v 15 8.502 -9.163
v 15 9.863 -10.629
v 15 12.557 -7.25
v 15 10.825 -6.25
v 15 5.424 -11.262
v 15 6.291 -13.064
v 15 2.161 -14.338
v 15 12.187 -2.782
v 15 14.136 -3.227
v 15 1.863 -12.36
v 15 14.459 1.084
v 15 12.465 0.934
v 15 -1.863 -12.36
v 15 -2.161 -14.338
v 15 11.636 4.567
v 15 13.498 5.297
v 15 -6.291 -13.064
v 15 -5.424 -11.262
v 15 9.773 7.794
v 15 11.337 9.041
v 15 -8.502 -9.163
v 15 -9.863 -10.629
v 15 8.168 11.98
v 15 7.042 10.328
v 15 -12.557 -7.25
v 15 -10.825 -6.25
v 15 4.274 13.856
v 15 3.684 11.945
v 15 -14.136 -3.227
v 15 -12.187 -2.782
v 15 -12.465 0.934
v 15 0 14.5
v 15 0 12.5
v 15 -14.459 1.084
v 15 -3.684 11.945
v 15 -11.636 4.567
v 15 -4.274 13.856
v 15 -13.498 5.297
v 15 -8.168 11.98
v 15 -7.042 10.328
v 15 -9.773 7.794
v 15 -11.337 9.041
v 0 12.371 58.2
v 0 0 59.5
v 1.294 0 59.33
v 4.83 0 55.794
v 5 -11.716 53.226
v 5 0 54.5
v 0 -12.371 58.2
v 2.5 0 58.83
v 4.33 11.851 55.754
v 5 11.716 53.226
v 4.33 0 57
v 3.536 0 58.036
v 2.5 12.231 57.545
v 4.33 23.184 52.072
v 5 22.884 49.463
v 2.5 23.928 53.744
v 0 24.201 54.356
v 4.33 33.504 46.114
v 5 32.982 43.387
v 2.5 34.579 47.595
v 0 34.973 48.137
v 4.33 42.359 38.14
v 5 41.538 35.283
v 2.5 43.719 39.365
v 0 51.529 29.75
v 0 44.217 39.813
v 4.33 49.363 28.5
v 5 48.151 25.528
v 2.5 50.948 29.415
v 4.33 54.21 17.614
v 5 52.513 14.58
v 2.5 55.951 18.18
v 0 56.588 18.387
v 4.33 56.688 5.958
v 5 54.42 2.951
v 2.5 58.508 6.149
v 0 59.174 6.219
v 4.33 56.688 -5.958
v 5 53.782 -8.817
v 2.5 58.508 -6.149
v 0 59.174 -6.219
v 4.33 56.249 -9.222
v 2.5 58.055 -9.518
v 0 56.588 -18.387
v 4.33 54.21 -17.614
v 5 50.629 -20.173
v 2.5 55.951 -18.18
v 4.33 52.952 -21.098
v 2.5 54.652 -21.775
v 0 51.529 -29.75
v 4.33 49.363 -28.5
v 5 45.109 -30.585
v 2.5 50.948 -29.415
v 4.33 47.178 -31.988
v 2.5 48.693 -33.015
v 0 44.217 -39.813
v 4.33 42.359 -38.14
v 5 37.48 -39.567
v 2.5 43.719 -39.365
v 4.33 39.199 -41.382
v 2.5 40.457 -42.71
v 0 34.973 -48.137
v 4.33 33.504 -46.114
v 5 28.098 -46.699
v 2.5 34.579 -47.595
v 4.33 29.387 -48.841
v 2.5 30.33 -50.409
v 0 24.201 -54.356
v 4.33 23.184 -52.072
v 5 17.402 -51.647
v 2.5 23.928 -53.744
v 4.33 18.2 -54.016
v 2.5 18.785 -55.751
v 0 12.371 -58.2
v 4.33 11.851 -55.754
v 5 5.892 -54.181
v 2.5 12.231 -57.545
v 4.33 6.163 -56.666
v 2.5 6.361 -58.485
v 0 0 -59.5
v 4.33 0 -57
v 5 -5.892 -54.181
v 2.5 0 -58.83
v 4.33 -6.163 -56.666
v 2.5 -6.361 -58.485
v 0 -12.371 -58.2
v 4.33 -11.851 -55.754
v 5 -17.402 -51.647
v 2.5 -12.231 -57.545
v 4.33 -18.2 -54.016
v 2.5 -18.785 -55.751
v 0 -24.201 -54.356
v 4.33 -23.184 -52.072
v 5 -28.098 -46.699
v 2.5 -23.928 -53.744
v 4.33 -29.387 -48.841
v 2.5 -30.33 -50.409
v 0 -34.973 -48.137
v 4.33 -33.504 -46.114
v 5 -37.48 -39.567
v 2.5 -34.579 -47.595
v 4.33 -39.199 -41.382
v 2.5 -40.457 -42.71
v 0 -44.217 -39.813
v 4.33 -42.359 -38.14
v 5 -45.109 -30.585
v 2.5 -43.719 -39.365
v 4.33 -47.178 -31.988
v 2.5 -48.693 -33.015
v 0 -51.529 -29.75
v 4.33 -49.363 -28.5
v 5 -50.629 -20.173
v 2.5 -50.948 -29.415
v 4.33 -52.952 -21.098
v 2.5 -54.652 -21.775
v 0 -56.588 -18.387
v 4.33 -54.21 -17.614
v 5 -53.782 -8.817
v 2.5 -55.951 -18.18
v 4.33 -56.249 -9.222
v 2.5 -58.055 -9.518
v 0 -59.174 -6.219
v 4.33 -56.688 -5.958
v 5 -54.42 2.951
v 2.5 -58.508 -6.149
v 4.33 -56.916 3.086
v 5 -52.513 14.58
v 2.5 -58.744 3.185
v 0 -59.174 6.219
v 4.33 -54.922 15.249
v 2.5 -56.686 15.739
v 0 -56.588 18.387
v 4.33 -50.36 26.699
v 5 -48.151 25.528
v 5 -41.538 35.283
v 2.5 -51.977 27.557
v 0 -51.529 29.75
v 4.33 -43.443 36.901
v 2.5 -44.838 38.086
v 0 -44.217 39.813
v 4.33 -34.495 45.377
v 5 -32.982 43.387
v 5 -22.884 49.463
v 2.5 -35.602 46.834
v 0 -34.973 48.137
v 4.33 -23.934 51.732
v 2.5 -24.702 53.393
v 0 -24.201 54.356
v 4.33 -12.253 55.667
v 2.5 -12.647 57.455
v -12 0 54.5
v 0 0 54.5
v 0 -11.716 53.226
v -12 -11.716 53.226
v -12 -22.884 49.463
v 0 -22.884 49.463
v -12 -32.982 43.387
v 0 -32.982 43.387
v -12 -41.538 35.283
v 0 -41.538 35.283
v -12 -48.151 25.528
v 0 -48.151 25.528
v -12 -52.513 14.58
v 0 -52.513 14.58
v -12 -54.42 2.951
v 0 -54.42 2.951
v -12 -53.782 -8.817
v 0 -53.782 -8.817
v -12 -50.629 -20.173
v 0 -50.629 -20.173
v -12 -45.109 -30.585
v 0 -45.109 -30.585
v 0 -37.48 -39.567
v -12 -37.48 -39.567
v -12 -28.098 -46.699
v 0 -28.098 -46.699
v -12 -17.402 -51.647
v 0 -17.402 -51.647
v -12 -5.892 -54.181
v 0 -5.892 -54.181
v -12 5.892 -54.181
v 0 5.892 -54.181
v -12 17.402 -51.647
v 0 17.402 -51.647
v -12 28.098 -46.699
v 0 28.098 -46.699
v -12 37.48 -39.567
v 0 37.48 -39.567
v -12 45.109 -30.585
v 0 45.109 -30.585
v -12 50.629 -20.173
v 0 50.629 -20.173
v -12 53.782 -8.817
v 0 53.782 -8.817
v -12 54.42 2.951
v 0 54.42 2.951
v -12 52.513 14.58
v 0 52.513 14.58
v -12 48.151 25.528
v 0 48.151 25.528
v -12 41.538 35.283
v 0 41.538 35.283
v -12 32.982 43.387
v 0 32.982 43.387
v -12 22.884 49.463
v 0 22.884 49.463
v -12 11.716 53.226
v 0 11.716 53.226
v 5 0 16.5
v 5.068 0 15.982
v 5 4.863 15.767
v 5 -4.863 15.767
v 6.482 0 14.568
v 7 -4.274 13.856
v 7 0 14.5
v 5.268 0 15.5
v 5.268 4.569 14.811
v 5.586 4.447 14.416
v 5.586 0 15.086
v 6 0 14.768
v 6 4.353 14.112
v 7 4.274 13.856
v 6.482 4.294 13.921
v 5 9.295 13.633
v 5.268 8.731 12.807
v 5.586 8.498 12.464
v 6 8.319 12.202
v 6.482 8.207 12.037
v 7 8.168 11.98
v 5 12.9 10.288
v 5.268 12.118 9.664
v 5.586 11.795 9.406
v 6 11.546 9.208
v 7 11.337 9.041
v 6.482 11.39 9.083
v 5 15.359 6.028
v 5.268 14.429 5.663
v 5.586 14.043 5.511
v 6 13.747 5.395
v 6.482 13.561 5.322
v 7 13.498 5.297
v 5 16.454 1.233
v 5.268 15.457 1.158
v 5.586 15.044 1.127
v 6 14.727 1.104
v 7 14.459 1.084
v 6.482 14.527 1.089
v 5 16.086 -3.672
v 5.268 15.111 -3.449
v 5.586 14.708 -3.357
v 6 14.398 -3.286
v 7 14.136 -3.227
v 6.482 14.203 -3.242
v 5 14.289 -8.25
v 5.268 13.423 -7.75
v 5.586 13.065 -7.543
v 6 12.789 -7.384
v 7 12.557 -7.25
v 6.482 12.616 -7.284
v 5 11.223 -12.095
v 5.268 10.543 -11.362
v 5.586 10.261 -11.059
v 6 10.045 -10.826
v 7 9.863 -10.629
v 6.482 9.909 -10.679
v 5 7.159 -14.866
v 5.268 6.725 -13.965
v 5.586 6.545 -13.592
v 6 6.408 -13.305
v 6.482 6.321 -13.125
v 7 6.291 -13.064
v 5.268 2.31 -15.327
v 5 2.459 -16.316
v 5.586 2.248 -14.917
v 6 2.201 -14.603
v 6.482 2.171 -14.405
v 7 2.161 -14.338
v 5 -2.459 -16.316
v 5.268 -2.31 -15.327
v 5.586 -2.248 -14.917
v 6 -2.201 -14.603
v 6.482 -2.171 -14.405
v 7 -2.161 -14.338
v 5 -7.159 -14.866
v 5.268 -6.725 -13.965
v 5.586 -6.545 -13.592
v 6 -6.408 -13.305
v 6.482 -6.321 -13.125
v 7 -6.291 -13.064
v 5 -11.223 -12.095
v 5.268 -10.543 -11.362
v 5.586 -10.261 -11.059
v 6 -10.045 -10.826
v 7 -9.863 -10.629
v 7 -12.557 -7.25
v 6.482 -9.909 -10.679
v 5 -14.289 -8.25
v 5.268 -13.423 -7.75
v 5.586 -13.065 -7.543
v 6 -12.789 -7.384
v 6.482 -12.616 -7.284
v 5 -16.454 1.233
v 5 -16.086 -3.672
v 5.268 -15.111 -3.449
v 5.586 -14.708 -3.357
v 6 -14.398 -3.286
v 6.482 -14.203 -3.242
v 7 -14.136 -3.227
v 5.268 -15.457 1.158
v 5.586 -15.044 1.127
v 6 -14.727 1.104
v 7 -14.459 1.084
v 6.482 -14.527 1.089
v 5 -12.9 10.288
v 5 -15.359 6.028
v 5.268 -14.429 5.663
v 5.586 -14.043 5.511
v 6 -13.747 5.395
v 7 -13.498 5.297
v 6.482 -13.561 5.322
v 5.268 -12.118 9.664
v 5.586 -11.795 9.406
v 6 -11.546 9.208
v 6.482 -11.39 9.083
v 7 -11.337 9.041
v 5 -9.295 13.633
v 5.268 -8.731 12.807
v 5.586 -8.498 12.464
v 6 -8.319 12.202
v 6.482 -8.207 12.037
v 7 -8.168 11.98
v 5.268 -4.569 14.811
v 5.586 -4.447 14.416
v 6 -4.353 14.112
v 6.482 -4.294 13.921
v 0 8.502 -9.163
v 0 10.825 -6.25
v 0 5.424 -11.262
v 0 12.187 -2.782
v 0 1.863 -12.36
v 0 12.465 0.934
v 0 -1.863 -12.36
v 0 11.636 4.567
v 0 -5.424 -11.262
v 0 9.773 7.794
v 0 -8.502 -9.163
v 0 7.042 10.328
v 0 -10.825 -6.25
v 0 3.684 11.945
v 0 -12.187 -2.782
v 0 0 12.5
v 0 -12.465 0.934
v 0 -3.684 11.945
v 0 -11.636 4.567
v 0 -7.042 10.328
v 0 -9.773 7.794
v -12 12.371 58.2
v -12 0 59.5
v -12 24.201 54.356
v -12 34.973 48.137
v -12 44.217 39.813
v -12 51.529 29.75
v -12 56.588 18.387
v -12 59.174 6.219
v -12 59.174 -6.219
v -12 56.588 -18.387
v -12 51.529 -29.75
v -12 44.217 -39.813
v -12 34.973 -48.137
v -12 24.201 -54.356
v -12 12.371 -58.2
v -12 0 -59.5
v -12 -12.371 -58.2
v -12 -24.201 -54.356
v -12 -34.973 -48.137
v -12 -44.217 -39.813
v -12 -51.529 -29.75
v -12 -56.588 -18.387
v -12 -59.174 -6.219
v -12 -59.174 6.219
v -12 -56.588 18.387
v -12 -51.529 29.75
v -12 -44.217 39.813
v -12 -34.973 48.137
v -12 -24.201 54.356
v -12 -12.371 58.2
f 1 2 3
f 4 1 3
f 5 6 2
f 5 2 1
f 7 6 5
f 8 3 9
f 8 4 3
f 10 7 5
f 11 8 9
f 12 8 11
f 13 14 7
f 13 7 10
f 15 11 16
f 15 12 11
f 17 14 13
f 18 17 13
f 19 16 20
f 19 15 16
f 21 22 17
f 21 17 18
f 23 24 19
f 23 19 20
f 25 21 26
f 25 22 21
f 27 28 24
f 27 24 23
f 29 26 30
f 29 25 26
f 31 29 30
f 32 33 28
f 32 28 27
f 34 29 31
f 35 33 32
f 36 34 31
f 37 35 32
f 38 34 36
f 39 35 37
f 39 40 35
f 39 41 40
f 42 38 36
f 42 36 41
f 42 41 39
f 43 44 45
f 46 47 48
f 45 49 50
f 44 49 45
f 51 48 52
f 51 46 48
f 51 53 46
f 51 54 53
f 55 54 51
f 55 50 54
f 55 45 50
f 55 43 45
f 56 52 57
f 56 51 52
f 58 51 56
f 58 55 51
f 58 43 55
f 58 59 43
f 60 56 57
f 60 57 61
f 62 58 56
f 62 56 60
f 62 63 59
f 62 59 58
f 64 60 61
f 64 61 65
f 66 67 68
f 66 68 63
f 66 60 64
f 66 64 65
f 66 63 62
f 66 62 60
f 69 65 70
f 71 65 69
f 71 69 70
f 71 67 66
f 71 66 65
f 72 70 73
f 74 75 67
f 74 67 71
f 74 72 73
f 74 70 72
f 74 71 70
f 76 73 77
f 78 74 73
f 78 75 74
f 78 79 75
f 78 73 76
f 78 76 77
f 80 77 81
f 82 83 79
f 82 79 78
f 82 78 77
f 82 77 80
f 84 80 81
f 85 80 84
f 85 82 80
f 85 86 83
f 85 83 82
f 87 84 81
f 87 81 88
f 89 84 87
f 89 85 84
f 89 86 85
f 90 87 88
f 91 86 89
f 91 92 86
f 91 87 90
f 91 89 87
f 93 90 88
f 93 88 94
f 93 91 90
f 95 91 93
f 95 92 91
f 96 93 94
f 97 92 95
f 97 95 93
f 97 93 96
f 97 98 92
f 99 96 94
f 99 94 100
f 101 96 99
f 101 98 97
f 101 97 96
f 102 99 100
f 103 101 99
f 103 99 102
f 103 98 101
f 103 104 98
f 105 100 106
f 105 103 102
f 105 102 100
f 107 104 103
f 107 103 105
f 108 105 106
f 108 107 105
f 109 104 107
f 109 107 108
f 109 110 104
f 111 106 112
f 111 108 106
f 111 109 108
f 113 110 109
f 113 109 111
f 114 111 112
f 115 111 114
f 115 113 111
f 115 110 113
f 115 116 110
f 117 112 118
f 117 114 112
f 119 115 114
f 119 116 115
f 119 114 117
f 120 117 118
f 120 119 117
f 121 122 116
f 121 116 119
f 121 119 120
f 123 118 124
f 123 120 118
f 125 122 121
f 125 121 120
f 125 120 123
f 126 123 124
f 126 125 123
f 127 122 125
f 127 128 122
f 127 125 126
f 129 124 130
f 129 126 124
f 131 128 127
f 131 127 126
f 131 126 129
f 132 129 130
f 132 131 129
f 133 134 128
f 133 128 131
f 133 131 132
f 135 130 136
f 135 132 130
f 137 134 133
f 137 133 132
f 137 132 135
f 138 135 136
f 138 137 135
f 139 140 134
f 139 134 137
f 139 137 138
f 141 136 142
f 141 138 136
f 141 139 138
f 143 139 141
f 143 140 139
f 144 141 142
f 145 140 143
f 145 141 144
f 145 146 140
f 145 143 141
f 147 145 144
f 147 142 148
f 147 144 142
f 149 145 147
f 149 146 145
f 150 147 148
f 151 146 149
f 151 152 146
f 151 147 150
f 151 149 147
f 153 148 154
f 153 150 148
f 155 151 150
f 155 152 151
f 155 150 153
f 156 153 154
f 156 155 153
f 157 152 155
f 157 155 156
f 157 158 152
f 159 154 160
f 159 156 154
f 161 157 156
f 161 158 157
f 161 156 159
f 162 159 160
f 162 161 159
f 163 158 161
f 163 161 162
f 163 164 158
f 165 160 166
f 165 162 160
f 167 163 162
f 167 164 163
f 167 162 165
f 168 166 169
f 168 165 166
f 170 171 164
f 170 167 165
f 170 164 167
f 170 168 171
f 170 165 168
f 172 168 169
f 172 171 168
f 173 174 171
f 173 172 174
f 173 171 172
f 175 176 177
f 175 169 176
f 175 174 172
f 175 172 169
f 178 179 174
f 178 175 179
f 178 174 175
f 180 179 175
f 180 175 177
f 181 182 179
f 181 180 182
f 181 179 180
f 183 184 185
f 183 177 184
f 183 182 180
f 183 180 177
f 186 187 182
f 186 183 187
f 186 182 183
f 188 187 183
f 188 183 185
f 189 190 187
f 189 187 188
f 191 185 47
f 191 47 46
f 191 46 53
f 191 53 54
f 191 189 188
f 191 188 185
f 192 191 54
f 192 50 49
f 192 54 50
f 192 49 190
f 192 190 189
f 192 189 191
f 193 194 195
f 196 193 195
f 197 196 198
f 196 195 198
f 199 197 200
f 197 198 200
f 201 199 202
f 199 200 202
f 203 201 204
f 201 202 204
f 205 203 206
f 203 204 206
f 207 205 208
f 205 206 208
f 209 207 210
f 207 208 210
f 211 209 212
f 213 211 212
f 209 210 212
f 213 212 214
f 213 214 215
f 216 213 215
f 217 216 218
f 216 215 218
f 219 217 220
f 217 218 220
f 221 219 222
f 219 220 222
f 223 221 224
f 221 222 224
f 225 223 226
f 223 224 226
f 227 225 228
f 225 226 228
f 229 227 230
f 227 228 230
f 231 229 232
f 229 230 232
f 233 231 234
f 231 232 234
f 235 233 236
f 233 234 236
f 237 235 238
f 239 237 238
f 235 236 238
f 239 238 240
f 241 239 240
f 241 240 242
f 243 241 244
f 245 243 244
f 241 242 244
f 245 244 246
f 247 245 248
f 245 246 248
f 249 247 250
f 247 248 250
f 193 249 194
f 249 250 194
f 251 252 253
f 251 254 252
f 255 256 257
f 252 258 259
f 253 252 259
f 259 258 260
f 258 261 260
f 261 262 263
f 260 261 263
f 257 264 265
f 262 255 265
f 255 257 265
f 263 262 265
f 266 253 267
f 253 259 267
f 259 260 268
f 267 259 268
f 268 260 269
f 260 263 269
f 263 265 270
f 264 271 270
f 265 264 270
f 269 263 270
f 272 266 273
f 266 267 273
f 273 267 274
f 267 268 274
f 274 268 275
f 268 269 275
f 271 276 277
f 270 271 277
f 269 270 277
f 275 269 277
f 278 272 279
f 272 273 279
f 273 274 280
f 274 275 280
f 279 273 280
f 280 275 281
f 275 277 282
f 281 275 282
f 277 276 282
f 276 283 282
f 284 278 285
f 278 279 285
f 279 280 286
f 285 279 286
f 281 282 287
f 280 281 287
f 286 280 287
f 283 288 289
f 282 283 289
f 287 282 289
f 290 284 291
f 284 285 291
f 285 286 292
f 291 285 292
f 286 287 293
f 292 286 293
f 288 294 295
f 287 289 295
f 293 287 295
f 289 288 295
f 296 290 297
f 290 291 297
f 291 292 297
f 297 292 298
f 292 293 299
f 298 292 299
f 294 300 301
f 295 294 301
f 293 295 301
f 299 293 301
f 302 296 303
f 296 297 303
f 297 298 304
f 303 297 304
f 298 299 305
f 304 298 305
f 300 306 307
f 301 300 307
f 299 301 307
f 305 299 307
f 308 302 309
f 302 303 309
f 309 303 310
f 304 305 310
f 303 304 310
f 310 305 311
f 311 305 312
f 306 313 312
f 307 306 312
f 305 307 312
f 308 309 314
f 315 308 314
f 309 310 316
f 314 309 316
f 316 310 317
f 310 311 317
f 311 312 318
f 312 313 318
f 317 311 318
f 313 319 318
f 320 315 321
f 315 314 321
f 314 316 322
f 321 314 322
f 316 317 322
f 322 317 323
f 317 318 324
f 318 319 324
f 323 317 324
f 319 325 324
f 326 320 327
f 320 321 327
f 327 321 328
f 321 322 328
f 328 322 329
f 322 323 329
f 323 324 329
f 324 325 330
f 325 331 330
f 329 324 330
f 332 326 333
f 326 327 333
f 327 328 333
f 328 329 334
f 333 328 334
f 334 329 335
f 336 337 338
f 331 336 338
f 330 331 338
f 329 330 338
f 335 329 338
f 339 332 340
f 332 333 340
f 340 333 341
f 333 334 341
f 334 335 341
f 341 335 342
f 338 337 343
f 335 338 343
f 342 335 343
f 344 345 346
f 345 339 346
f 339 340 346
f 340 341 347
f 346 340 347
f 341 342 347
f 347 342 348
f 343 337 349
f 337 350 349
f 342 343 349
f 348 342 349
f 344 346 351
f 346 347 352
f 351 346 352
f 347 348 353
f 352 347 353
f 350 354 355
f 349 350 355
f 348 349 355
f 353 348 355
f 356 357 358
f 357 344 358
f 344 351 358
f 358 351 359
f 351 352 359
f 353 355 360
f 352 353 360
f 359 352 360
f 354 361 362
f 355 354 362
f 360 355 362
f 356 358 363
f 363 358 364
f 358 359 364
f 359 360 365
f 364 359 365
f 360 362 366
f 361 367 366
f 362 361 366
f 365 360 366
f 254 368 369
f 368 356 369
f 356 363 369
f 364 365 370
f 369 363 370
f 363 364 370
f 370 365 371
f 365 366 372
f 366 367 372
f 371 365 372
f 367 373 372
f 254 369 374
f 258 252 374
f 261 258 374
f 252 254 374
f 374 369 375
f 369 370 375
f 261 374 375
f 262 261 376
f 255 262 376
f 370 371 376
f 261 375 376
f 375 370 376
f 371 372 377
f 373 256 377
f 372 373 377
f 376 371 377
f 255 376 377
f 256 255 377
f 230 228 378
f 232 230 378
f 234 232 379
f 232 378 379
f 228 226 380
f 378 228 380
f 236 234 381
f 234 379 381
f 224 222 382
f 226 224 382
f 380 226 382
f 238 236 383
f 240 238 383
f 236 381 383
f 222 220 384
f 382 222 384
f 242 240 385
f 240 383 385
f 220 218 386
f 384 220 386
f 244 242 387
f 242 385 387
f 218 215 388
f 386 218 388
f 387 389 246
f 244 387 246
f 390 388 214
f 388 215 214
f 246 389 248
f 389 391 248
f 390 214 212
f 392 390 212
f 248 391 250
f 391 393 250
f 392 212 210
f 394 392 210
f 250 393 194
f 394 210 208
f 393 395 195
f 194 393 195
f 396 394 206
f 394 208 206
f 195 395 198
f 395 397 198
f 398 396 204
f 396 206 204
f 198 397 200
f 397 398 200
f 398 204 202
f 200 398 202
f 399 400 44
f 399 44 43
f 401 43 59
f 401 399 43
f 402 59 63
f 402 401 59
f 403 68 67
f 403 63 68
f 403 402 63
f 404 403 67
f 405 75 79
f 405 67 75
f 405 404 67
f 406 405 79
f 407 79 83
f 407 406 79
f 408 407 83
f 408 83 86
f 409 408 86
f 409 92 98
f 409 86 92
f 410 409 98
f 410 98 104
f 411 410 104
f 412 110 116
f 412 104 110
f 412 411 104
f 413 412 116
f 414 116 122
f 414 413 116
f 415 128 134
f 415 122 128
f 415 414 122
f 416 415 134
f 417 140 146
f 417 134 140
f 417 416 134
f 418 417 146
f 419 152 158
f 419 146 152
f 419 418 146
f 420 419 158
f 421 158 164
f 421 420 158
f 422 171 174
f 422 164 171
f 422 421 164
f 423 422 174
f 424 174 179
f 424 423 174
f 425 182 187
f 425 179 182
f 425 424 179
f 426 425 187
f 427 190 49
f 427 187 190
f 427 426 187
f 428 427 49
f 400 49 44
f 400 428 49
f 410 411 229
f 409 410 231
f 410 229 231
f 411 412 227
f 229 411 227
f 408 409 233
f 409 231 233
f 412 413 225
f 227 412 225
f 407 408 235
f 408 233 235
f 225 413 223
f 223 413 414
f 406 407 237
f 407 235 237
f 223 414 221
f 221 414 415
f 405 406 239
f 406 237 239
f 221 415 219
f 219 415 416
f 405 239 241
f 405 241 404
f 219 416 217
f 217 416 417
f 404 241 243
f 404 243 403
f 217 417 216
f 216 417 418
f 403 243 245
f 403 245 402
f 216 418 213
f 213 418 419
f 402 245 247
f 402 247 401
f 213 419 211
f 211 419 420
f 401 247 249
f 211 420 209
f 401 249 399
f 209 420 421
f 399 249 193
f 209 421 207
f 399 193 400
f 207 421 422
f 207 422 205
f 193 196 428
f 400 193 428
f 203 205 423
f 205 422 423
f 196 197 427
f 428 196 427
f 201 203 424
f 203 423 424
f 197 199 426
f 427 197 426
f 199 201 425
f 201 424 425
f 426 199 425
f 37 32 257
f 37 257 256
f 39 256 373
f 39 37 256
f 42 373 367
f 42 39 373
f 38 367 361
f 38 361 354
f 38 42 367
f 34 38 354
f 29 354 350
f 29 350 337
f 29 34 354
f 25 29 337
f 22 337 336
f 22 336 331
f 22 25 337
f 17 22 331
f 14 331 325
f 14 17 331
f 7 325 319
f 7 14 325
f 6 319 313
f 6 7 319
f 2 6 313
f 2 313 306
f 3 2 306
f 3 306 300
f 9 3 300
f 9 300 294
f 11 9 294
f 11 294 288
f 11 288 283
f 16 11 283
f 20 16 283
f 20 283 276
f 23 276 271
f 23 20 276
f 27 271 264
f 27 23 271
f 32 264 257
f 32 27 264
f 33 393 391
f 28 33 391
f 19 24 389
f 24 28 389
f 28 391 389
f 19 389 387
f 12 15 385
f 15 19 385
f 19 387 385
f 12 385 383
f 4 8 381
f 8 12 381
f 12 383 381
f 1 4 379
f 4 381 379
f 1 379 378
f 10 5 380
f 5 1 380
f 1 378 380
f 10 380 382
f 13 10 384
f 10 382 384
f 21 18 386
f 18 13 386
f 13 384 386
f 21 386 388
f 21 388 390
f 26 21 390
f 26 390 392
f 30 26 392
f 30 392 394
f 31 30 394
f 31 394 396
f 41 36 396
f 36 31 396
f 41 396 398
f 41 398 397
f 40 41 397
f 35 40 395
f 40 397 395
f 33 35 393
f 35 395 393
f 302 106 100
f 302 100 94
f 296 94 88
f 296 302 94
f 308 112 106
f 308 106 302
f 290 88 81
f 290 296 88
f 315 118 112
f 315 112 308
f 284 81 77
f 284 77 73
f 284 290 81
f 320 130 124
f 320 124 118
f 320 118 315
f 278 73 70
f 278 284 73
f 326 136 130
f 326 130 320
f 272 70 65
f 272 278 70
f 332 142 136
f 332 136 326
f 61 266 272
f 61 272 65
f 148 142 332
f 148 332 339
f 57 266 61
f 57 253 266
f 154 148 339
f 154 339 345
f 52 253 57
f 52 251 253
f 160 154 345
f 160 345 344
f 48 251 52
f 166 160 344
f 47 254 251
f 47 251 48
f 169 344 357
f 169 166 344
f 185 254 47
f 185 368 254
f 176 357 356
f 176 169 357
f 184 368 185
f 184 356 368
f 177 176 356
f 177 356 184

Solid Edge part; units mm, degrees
sketch "Sketch1" plane through (0, 0, 0) normal (0, -1, 0) x (1, 0, 0)
  line L0 (0, 54.5) -> (0, 12.5)
  line L1 (5, 12.5) -> (0, 12.5)
  line L2 (5, 59.5) -> (5, 12.5)
  line L3 (5, 59.5) -> (-12, 59.5)
  line L4 (-12, 59.5) -> (-12, 54.5)
  line L5 (-12, 54.5) -> (0, 54.5)
  dimension "D1" = 5
  dimension "D2" = 12.5
  dimension "D3" = 5
  dimension "D4" = 12
  dimension "D5" = 54.5
revolve "RevolvedProtrusion1" add sketch "Sketch1" angle 360 about axis through (0, 0, 0) along (1, 0, 0)
sketch "Sketch2" plane through (0, 0, 0) normal (0, 1, 0) x (-1, 0, 0)
  line L0 (-5, 12.5) -> (-5, 14.5)
  line L1 (-5, 14.5) -> (-15, 14.5)
  line L2 (-15, 14.5) -> (-15, 12.5)
  line L3 (-15, 12.5) -> (-5, 12.5)
  dimension "D1" = 10
  dimension "D2" = 2
revolve "RevolvedProtrusion2" add sketch "Sketch2" angle 360 about axis through (0, 0, 0) along (1, 0, 0)
fillet "Round1" radius 2 1 edges at (5, 0, 14.5)
fillet "Round_7" radius 5 1 edges at (5, 0, -59.5)
properties material "Steel"
